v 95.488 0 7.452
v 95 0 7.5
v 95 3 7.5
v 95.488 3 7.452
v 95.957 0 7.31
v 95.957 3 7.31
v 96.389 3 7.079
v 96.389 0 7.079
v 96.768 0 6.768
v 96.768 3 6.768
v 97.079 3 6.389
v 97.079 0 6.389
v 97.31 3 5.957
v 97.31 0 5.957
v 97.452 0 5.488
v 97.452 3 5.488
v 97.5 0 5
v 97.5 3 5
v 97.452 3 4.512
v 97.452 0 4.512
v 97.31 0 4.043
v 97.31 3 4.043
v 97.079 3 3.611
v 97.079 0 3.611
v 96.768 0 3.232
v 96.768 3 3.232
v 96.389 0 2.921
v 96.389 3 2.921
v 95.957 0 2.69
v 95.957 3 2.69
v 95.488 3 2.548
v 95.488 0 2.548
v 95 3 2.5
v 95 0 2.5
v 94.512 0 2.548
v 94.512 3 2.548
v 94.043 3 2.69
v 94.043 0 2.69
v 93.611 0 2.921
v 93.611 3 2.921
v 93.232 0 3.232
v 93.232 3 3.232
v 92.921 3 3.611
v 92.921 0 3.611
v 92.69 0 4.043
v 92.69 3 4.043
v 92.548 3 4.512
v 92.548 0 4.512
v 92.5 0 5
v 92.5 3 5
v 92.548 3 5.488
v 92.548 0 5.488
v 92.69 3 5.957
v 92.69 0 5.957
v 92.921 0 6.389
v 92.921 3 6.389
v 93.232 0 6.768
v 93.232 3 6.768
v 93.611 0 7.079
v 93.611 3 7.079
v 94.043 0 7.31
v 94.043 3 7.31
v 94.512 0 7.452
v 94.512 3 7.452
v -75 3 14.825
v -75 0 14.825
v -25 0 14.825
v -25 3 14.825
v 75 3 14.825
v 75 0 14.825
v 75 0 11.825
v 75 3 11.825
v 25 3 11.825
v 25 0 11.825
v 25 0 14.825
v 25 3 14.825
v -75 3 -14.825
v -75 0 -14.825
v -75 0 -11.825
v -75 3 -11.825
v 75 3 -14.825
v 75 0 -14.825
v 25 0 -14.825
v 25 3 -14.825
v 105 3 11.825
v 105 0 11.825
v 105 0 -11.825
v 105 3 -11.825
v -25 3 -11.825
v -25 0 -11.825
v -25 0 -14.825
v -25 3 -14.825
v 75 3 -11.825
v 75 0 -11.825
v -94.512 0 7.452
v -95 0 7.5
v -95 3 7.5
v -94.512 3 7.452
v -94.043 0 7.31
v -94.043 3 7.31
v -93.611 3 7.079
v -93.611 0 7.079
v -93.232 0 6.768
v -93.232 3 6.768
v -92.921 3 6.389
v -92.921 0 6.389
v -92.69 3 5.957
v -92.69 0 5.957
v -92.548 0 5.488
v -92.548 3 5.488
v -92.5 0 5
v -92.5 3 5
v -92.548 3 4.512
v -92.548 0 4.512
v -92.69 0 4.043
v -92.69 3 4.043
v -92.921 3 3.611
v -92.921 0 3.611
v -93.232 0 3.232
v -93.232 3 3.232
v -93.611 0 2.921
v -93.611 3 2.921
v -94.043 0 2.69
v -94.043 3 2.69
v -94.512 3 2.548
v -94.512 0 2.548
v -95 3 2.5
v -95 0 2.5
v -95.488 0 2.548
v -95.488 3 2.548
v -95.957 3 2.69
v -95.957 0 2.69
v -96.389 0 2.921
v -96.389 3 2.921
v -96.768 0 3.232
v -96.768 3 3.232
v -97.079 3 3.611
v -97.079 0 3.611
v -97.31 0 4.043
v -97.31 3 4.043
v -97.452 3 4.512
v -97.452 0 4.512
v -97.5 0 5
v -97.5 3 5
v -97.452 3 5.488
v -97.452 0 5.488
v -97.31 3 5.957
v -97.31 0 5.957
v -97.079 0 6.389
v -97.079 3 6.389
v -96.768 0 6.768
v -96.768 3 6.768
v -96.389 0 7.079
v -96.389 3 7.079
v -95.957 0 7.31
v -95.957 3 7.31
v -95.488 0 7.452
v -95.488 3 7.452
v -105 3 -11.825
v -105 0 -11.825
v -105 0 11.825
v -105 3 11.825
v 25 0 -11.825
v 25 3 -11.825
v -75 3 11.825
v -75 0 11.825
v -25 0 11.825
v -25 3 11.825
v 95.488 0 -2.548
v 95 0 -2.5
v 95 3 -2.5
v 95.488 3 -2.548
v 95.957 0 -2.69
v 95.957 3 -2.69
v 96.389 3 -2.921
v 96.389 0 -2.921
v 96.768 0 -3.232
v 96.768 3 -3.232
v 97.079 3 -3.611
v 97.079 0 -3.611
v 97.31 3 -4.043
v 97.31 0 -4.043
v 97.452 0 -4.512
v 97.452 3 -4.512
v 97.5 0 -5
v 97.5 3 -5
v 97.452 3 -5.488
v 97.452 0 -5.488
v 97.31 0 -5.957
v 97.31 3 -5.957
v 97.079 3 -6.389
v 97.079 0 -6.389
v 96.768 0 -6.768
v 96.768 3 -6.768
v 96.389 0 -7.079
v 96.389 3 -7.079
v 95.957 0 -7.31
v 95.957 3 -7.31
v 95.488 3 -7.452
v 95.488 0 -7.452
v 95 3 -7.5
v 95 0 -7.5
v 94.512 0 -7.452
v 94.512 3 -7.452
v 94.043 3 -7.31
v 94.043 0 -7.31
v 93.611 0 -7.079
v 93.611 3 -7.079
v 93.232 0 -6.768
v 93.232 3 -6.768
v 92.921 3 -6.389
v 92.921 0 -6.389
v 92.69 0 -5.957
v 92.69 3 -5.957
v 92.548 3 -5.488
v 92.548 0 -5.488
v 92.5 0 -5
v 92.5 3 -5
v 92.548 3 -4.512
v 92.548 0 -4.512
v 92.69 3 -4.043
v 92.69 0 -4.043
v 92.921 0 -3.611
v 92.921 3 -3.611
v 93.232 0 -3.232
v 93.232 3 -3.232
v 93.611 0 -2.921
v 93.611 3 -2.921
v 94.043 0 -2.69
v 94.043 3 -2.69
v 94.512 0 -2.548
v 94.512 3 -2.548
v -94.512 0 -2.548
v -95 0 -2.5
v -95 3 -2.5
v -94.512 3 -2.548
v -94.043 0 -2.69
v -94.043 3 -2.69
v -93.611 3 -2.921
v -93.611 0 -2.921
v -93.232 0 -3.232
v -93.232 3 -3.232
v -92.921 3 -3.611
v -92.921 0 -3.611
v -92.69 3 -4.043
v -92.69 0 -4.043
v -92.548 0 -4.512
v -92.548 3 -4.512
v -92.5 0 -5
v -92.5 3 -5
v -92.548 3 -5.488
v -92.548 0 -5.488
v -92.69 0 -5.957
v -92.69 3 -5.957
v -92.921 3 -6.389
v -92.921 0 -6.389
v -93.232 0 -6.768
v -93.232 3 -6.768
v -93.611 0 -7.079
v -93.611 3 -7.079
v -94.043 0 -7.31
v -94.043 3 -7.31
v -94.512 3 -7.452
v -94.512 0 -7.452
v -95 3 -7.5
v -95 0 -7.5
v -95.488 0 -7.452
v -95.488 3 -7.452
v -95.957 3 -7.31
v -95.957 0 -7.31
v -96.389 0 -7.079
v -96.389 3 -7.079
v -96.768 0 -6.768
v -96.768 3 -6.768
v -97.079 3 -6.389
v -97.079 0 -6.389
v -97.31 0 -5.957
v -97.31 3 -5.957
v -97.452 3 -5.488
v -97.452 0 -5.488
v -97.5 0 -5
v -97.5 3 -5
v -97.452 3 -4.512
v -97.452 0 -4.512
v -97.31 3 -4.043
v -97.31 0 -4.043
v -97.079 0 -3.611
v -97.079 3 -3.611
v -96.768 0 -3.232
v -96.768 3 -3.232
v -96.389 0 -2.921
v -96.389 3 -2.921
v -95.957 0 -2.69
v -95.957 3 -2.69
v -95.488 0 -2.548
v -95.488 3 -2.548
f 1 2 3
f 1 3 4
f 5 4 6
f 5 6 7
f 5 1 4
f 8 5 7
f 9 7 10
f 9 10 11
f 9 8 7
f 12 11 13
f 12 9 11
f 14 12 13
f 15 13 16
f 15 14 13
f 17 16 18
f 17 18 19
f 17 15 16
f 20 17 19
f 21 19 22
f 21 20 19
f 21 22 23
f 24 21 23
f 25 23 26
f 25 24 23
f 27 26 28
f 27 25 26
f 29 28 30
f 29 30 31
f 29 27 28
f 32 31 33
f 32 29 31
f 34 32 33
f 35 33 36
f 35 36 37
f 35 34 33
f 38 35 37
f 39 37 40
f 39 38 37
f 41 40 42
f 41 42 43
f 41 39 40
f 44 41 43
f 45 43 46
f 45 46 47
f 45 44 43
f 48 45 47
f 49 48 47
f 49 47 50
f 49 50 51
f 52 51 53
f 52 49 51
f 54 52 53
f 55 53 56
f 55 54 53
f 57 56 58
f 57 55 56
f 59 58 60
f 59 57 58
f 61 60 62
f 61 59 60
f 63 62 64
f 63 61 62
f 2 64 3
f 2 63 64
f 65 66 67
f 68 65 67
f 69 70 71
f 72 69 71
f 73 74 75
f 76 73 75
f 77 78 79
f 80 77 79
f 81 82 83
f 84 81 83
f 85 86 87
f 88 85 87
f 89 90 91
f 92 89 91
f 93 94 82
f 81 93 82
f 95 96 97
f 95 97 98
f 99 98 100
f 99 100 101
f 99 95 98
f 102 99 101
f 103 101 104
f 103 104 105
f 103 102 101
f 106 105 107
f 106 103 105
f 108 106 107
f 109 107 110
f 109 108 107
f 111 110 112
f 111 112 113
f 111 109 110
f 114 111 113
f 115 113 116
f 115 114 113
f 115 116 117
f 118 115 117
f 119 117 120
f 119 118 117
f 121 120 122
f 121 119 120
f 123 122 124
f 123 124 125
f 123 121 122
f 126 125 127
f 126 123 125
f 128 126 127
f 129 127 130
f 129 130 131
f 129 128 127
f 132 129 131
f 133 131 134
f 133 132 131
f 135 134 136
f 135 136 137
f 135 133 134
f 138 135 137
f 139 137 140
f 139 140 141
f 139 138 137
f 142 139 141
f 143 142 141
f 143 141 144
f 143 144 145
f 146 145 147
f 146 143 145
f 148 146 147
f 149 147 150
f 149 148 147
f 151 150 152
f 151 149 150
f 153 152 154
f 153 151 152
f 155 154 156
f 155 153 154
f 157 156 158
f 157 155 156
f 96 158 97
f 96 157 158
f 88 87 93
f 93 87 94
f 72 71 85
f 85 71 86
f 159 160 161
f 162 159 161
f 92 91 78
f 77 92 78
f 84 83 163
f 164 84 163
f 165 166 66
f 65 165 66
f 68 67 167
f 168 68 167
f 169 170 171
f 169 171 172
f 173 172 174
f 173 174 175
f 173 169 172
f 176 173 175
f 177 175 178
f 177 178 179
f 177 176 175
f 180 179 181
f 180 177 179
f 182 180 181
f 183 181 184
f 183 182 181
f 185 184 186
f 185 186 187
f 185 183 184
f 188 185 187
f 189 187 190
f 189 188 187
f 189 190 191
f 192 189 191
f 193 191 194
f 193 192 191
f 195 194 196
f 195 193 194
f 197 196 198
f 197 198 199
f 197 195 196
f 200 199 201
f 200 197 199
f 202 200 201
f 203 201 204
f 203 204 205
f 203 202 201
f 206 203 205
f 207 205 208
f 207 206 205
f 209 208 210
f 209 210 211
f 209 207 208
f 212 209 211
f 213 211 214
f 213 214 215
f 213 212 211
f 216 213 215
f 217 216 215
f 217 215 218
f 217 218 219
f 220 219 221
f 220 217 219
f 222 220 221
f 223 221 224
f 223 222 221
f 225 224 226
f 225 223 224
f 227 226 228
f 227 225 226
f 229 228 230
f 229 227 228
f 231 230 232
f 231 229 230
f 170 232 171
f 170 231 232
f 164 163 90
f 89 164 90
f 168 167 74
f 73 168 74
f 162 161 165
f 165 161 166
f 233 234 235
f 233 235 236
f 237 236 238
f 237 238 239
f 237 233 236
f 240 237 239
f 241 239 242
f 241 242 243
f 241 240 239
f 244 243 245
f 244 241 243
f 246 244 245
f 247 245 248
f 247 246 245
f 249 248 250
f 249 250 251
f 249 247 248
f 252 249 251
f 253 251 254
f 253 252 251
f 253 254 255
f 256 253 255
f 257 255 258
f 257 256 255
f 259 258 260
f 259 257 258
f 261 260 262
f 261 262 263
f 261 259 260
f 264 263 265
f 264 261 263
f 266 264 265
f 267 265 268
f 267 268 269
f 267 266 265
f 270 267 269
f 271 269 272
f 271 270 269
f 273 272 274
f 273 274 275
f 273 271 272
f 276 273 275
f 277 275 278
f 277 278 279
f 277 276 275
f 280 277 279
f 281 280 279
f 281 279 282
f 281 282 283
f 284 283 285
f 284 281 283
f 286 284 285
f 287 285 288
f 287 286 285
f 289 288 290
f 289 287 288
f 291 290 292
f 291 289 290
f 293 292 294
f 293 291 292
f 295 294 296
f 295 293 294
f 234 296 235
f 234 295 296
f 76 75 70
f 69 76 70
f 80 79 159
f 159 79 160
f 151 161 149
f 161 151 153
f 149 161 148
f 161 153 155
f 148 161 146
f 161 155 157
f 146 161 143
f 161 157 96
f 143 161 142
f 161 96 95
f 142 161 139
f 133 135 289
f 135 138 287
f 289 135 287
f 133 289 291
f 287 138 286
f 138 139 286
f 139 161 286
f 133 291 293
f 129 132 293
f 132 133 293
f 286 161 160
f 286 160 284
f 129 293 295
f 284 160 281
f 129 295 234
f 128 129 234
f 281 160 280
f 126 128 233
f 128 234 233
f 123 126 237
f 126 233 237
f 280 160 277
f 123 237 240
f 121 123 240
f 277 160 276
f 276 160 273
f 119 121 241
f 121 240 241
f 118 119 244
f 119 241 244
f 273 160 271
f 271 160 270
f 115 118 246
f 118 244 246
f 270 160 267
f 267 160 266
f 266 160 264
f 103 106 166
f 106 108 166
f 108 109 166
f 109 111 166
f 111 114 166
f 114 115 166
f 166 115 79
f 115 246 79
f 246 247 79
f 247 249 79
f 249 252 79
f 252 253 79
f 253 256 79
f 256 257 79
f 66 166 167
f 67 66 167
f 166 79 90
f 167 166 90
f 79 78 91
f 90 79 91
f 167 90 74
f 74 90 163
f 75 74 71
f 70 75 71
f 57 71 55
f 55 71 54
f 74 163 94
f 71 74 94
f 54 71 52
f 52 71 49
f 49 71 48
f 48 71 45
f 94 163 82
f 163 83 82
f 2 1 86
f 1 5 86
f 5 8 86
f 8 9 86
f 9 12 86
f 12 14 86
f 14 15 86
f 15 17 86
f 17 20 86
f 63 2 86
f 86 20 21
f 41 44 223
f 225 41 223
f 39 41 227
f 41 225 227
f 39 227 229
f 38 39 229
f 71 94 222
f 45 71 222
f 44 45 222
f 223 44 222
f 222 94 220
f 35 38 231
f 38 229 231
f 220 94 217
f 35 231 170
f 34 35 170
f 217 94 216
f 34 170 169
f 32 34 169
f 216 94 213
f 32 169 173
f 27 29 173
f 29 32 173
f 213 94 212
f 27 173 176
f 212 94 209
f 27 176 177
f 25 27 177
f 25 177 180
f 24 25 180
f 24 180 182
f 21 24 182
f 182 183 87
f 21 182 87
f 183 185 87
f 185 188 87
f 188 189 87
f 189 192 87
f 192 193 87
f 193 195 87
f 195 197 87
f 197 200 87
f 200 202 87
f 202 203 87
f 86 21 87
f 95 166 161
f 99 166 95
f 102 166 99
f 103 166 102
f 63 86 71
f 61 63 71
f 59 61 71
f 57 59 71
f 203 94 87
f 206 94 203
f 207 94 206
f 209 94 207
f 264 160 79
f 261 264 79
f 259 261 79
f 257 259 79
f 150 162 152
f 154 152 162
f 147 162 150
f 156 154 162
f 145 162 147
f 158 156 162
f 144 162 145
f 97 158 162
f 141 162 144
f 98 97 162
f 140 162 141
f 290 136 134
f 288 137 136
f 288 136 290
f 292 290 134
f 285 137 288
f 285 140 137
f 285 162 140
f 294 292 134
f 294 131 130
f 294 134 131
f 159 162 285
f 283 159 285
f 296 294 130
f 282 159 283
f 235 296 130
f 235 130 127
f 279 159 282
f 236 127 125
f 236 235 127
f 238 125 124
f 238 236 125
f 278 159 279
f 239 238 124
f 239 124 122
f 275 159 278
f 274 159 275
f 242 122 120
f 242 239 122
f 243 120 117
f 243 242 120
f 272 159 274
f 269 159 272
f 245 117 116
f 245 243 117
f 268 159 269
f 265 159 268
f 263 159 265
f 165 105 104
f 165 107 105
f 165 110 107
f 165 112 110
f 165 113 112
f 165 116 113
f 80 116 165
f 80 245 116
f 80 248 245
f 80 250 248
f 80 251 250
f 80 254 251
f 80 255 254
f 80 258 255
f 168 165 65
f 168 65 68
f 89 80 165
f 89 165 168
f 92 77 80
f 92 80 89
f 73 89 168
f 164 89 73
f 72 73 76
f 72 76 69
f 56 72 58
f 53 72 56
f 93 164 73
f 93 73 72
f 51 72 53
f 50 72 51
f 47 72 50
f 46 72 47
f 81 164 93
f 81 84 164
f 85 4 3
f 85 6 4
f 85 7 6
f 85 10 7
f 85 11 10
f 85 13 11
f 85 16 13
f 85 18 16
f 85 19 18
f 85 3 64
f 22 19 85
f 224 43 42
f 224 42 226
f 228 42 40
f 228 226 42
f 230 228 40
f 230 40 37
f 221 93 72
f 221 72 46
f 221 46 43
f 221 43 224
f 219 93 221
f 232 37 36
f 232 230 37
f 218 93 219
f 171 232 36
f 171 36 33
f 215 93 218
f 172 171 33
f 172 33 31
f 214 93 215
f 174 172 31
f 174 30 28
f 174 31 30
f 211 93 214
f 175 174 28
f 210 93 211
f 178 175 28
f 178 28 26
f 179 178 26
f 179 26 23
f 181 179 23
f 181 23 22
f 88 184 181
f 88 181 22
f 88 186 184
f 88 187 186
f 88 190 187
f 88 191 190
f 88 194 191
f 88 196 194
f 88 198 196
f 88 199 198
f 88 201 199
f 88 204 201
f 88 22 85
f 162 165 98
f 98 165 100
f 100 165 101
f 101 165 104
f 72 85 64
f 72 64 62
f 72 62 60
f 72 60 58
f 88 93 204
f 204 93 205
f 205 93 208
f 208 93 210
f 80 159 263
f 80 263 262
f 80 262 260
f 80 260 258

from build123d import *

# Parameters (mm, degrees)
SKETCH1_R           = 2.5
BOSS_EXTRUDE1_DEPTH = 3


with BuildPart() as part:
    # Sketch1 → Boss-Extrude1 (new body)
    with BuildSketch(Plane(origin=(0, 0, 0), x_dir=(1, 0, 0), z_dir=(0, 1, 0))):
        Polygon((-105, -11.825), (-75, -11.825), (-75, -14.825), (-25, -14.825), (-25, -11.825), (25, -11.825), (25, -14.825), (75, -14.825), (75, -11.825), (105, -11.825), (105, 11.825), (75, 11.825), (75, 14.825), (25, 14.825), (25, 11.825), (-25, 11.825), (-25, 14.825), (-75, 14.825), (-75, 11.825), (-105, 11.825), align=None)
        with Locations(Location((-95, 5, 0), (0, 0, 270))):
            Circle(SKETCH1_R, mode=Mode.SUBTRACT)
        with Locations(Location((-95, -5, 0), (0, 0, 270))):
            Circle(SKETCH1_R, mode=Mode.SUBTRACT)
        with Locations(Location((95, 5, 0), (0, 0, 270))):
            Circle(SKETCH1_R, mode=Mode.SUBTRACT)
        with Locations(Location((95, -5, 0), (0, 0, 270))):
            Circle(SKETCH1_R, mode=Mode.SUBTRACT)
    extrude(amount=BOSS_EXTRUDE1_DEPTH)


solid = part.part
